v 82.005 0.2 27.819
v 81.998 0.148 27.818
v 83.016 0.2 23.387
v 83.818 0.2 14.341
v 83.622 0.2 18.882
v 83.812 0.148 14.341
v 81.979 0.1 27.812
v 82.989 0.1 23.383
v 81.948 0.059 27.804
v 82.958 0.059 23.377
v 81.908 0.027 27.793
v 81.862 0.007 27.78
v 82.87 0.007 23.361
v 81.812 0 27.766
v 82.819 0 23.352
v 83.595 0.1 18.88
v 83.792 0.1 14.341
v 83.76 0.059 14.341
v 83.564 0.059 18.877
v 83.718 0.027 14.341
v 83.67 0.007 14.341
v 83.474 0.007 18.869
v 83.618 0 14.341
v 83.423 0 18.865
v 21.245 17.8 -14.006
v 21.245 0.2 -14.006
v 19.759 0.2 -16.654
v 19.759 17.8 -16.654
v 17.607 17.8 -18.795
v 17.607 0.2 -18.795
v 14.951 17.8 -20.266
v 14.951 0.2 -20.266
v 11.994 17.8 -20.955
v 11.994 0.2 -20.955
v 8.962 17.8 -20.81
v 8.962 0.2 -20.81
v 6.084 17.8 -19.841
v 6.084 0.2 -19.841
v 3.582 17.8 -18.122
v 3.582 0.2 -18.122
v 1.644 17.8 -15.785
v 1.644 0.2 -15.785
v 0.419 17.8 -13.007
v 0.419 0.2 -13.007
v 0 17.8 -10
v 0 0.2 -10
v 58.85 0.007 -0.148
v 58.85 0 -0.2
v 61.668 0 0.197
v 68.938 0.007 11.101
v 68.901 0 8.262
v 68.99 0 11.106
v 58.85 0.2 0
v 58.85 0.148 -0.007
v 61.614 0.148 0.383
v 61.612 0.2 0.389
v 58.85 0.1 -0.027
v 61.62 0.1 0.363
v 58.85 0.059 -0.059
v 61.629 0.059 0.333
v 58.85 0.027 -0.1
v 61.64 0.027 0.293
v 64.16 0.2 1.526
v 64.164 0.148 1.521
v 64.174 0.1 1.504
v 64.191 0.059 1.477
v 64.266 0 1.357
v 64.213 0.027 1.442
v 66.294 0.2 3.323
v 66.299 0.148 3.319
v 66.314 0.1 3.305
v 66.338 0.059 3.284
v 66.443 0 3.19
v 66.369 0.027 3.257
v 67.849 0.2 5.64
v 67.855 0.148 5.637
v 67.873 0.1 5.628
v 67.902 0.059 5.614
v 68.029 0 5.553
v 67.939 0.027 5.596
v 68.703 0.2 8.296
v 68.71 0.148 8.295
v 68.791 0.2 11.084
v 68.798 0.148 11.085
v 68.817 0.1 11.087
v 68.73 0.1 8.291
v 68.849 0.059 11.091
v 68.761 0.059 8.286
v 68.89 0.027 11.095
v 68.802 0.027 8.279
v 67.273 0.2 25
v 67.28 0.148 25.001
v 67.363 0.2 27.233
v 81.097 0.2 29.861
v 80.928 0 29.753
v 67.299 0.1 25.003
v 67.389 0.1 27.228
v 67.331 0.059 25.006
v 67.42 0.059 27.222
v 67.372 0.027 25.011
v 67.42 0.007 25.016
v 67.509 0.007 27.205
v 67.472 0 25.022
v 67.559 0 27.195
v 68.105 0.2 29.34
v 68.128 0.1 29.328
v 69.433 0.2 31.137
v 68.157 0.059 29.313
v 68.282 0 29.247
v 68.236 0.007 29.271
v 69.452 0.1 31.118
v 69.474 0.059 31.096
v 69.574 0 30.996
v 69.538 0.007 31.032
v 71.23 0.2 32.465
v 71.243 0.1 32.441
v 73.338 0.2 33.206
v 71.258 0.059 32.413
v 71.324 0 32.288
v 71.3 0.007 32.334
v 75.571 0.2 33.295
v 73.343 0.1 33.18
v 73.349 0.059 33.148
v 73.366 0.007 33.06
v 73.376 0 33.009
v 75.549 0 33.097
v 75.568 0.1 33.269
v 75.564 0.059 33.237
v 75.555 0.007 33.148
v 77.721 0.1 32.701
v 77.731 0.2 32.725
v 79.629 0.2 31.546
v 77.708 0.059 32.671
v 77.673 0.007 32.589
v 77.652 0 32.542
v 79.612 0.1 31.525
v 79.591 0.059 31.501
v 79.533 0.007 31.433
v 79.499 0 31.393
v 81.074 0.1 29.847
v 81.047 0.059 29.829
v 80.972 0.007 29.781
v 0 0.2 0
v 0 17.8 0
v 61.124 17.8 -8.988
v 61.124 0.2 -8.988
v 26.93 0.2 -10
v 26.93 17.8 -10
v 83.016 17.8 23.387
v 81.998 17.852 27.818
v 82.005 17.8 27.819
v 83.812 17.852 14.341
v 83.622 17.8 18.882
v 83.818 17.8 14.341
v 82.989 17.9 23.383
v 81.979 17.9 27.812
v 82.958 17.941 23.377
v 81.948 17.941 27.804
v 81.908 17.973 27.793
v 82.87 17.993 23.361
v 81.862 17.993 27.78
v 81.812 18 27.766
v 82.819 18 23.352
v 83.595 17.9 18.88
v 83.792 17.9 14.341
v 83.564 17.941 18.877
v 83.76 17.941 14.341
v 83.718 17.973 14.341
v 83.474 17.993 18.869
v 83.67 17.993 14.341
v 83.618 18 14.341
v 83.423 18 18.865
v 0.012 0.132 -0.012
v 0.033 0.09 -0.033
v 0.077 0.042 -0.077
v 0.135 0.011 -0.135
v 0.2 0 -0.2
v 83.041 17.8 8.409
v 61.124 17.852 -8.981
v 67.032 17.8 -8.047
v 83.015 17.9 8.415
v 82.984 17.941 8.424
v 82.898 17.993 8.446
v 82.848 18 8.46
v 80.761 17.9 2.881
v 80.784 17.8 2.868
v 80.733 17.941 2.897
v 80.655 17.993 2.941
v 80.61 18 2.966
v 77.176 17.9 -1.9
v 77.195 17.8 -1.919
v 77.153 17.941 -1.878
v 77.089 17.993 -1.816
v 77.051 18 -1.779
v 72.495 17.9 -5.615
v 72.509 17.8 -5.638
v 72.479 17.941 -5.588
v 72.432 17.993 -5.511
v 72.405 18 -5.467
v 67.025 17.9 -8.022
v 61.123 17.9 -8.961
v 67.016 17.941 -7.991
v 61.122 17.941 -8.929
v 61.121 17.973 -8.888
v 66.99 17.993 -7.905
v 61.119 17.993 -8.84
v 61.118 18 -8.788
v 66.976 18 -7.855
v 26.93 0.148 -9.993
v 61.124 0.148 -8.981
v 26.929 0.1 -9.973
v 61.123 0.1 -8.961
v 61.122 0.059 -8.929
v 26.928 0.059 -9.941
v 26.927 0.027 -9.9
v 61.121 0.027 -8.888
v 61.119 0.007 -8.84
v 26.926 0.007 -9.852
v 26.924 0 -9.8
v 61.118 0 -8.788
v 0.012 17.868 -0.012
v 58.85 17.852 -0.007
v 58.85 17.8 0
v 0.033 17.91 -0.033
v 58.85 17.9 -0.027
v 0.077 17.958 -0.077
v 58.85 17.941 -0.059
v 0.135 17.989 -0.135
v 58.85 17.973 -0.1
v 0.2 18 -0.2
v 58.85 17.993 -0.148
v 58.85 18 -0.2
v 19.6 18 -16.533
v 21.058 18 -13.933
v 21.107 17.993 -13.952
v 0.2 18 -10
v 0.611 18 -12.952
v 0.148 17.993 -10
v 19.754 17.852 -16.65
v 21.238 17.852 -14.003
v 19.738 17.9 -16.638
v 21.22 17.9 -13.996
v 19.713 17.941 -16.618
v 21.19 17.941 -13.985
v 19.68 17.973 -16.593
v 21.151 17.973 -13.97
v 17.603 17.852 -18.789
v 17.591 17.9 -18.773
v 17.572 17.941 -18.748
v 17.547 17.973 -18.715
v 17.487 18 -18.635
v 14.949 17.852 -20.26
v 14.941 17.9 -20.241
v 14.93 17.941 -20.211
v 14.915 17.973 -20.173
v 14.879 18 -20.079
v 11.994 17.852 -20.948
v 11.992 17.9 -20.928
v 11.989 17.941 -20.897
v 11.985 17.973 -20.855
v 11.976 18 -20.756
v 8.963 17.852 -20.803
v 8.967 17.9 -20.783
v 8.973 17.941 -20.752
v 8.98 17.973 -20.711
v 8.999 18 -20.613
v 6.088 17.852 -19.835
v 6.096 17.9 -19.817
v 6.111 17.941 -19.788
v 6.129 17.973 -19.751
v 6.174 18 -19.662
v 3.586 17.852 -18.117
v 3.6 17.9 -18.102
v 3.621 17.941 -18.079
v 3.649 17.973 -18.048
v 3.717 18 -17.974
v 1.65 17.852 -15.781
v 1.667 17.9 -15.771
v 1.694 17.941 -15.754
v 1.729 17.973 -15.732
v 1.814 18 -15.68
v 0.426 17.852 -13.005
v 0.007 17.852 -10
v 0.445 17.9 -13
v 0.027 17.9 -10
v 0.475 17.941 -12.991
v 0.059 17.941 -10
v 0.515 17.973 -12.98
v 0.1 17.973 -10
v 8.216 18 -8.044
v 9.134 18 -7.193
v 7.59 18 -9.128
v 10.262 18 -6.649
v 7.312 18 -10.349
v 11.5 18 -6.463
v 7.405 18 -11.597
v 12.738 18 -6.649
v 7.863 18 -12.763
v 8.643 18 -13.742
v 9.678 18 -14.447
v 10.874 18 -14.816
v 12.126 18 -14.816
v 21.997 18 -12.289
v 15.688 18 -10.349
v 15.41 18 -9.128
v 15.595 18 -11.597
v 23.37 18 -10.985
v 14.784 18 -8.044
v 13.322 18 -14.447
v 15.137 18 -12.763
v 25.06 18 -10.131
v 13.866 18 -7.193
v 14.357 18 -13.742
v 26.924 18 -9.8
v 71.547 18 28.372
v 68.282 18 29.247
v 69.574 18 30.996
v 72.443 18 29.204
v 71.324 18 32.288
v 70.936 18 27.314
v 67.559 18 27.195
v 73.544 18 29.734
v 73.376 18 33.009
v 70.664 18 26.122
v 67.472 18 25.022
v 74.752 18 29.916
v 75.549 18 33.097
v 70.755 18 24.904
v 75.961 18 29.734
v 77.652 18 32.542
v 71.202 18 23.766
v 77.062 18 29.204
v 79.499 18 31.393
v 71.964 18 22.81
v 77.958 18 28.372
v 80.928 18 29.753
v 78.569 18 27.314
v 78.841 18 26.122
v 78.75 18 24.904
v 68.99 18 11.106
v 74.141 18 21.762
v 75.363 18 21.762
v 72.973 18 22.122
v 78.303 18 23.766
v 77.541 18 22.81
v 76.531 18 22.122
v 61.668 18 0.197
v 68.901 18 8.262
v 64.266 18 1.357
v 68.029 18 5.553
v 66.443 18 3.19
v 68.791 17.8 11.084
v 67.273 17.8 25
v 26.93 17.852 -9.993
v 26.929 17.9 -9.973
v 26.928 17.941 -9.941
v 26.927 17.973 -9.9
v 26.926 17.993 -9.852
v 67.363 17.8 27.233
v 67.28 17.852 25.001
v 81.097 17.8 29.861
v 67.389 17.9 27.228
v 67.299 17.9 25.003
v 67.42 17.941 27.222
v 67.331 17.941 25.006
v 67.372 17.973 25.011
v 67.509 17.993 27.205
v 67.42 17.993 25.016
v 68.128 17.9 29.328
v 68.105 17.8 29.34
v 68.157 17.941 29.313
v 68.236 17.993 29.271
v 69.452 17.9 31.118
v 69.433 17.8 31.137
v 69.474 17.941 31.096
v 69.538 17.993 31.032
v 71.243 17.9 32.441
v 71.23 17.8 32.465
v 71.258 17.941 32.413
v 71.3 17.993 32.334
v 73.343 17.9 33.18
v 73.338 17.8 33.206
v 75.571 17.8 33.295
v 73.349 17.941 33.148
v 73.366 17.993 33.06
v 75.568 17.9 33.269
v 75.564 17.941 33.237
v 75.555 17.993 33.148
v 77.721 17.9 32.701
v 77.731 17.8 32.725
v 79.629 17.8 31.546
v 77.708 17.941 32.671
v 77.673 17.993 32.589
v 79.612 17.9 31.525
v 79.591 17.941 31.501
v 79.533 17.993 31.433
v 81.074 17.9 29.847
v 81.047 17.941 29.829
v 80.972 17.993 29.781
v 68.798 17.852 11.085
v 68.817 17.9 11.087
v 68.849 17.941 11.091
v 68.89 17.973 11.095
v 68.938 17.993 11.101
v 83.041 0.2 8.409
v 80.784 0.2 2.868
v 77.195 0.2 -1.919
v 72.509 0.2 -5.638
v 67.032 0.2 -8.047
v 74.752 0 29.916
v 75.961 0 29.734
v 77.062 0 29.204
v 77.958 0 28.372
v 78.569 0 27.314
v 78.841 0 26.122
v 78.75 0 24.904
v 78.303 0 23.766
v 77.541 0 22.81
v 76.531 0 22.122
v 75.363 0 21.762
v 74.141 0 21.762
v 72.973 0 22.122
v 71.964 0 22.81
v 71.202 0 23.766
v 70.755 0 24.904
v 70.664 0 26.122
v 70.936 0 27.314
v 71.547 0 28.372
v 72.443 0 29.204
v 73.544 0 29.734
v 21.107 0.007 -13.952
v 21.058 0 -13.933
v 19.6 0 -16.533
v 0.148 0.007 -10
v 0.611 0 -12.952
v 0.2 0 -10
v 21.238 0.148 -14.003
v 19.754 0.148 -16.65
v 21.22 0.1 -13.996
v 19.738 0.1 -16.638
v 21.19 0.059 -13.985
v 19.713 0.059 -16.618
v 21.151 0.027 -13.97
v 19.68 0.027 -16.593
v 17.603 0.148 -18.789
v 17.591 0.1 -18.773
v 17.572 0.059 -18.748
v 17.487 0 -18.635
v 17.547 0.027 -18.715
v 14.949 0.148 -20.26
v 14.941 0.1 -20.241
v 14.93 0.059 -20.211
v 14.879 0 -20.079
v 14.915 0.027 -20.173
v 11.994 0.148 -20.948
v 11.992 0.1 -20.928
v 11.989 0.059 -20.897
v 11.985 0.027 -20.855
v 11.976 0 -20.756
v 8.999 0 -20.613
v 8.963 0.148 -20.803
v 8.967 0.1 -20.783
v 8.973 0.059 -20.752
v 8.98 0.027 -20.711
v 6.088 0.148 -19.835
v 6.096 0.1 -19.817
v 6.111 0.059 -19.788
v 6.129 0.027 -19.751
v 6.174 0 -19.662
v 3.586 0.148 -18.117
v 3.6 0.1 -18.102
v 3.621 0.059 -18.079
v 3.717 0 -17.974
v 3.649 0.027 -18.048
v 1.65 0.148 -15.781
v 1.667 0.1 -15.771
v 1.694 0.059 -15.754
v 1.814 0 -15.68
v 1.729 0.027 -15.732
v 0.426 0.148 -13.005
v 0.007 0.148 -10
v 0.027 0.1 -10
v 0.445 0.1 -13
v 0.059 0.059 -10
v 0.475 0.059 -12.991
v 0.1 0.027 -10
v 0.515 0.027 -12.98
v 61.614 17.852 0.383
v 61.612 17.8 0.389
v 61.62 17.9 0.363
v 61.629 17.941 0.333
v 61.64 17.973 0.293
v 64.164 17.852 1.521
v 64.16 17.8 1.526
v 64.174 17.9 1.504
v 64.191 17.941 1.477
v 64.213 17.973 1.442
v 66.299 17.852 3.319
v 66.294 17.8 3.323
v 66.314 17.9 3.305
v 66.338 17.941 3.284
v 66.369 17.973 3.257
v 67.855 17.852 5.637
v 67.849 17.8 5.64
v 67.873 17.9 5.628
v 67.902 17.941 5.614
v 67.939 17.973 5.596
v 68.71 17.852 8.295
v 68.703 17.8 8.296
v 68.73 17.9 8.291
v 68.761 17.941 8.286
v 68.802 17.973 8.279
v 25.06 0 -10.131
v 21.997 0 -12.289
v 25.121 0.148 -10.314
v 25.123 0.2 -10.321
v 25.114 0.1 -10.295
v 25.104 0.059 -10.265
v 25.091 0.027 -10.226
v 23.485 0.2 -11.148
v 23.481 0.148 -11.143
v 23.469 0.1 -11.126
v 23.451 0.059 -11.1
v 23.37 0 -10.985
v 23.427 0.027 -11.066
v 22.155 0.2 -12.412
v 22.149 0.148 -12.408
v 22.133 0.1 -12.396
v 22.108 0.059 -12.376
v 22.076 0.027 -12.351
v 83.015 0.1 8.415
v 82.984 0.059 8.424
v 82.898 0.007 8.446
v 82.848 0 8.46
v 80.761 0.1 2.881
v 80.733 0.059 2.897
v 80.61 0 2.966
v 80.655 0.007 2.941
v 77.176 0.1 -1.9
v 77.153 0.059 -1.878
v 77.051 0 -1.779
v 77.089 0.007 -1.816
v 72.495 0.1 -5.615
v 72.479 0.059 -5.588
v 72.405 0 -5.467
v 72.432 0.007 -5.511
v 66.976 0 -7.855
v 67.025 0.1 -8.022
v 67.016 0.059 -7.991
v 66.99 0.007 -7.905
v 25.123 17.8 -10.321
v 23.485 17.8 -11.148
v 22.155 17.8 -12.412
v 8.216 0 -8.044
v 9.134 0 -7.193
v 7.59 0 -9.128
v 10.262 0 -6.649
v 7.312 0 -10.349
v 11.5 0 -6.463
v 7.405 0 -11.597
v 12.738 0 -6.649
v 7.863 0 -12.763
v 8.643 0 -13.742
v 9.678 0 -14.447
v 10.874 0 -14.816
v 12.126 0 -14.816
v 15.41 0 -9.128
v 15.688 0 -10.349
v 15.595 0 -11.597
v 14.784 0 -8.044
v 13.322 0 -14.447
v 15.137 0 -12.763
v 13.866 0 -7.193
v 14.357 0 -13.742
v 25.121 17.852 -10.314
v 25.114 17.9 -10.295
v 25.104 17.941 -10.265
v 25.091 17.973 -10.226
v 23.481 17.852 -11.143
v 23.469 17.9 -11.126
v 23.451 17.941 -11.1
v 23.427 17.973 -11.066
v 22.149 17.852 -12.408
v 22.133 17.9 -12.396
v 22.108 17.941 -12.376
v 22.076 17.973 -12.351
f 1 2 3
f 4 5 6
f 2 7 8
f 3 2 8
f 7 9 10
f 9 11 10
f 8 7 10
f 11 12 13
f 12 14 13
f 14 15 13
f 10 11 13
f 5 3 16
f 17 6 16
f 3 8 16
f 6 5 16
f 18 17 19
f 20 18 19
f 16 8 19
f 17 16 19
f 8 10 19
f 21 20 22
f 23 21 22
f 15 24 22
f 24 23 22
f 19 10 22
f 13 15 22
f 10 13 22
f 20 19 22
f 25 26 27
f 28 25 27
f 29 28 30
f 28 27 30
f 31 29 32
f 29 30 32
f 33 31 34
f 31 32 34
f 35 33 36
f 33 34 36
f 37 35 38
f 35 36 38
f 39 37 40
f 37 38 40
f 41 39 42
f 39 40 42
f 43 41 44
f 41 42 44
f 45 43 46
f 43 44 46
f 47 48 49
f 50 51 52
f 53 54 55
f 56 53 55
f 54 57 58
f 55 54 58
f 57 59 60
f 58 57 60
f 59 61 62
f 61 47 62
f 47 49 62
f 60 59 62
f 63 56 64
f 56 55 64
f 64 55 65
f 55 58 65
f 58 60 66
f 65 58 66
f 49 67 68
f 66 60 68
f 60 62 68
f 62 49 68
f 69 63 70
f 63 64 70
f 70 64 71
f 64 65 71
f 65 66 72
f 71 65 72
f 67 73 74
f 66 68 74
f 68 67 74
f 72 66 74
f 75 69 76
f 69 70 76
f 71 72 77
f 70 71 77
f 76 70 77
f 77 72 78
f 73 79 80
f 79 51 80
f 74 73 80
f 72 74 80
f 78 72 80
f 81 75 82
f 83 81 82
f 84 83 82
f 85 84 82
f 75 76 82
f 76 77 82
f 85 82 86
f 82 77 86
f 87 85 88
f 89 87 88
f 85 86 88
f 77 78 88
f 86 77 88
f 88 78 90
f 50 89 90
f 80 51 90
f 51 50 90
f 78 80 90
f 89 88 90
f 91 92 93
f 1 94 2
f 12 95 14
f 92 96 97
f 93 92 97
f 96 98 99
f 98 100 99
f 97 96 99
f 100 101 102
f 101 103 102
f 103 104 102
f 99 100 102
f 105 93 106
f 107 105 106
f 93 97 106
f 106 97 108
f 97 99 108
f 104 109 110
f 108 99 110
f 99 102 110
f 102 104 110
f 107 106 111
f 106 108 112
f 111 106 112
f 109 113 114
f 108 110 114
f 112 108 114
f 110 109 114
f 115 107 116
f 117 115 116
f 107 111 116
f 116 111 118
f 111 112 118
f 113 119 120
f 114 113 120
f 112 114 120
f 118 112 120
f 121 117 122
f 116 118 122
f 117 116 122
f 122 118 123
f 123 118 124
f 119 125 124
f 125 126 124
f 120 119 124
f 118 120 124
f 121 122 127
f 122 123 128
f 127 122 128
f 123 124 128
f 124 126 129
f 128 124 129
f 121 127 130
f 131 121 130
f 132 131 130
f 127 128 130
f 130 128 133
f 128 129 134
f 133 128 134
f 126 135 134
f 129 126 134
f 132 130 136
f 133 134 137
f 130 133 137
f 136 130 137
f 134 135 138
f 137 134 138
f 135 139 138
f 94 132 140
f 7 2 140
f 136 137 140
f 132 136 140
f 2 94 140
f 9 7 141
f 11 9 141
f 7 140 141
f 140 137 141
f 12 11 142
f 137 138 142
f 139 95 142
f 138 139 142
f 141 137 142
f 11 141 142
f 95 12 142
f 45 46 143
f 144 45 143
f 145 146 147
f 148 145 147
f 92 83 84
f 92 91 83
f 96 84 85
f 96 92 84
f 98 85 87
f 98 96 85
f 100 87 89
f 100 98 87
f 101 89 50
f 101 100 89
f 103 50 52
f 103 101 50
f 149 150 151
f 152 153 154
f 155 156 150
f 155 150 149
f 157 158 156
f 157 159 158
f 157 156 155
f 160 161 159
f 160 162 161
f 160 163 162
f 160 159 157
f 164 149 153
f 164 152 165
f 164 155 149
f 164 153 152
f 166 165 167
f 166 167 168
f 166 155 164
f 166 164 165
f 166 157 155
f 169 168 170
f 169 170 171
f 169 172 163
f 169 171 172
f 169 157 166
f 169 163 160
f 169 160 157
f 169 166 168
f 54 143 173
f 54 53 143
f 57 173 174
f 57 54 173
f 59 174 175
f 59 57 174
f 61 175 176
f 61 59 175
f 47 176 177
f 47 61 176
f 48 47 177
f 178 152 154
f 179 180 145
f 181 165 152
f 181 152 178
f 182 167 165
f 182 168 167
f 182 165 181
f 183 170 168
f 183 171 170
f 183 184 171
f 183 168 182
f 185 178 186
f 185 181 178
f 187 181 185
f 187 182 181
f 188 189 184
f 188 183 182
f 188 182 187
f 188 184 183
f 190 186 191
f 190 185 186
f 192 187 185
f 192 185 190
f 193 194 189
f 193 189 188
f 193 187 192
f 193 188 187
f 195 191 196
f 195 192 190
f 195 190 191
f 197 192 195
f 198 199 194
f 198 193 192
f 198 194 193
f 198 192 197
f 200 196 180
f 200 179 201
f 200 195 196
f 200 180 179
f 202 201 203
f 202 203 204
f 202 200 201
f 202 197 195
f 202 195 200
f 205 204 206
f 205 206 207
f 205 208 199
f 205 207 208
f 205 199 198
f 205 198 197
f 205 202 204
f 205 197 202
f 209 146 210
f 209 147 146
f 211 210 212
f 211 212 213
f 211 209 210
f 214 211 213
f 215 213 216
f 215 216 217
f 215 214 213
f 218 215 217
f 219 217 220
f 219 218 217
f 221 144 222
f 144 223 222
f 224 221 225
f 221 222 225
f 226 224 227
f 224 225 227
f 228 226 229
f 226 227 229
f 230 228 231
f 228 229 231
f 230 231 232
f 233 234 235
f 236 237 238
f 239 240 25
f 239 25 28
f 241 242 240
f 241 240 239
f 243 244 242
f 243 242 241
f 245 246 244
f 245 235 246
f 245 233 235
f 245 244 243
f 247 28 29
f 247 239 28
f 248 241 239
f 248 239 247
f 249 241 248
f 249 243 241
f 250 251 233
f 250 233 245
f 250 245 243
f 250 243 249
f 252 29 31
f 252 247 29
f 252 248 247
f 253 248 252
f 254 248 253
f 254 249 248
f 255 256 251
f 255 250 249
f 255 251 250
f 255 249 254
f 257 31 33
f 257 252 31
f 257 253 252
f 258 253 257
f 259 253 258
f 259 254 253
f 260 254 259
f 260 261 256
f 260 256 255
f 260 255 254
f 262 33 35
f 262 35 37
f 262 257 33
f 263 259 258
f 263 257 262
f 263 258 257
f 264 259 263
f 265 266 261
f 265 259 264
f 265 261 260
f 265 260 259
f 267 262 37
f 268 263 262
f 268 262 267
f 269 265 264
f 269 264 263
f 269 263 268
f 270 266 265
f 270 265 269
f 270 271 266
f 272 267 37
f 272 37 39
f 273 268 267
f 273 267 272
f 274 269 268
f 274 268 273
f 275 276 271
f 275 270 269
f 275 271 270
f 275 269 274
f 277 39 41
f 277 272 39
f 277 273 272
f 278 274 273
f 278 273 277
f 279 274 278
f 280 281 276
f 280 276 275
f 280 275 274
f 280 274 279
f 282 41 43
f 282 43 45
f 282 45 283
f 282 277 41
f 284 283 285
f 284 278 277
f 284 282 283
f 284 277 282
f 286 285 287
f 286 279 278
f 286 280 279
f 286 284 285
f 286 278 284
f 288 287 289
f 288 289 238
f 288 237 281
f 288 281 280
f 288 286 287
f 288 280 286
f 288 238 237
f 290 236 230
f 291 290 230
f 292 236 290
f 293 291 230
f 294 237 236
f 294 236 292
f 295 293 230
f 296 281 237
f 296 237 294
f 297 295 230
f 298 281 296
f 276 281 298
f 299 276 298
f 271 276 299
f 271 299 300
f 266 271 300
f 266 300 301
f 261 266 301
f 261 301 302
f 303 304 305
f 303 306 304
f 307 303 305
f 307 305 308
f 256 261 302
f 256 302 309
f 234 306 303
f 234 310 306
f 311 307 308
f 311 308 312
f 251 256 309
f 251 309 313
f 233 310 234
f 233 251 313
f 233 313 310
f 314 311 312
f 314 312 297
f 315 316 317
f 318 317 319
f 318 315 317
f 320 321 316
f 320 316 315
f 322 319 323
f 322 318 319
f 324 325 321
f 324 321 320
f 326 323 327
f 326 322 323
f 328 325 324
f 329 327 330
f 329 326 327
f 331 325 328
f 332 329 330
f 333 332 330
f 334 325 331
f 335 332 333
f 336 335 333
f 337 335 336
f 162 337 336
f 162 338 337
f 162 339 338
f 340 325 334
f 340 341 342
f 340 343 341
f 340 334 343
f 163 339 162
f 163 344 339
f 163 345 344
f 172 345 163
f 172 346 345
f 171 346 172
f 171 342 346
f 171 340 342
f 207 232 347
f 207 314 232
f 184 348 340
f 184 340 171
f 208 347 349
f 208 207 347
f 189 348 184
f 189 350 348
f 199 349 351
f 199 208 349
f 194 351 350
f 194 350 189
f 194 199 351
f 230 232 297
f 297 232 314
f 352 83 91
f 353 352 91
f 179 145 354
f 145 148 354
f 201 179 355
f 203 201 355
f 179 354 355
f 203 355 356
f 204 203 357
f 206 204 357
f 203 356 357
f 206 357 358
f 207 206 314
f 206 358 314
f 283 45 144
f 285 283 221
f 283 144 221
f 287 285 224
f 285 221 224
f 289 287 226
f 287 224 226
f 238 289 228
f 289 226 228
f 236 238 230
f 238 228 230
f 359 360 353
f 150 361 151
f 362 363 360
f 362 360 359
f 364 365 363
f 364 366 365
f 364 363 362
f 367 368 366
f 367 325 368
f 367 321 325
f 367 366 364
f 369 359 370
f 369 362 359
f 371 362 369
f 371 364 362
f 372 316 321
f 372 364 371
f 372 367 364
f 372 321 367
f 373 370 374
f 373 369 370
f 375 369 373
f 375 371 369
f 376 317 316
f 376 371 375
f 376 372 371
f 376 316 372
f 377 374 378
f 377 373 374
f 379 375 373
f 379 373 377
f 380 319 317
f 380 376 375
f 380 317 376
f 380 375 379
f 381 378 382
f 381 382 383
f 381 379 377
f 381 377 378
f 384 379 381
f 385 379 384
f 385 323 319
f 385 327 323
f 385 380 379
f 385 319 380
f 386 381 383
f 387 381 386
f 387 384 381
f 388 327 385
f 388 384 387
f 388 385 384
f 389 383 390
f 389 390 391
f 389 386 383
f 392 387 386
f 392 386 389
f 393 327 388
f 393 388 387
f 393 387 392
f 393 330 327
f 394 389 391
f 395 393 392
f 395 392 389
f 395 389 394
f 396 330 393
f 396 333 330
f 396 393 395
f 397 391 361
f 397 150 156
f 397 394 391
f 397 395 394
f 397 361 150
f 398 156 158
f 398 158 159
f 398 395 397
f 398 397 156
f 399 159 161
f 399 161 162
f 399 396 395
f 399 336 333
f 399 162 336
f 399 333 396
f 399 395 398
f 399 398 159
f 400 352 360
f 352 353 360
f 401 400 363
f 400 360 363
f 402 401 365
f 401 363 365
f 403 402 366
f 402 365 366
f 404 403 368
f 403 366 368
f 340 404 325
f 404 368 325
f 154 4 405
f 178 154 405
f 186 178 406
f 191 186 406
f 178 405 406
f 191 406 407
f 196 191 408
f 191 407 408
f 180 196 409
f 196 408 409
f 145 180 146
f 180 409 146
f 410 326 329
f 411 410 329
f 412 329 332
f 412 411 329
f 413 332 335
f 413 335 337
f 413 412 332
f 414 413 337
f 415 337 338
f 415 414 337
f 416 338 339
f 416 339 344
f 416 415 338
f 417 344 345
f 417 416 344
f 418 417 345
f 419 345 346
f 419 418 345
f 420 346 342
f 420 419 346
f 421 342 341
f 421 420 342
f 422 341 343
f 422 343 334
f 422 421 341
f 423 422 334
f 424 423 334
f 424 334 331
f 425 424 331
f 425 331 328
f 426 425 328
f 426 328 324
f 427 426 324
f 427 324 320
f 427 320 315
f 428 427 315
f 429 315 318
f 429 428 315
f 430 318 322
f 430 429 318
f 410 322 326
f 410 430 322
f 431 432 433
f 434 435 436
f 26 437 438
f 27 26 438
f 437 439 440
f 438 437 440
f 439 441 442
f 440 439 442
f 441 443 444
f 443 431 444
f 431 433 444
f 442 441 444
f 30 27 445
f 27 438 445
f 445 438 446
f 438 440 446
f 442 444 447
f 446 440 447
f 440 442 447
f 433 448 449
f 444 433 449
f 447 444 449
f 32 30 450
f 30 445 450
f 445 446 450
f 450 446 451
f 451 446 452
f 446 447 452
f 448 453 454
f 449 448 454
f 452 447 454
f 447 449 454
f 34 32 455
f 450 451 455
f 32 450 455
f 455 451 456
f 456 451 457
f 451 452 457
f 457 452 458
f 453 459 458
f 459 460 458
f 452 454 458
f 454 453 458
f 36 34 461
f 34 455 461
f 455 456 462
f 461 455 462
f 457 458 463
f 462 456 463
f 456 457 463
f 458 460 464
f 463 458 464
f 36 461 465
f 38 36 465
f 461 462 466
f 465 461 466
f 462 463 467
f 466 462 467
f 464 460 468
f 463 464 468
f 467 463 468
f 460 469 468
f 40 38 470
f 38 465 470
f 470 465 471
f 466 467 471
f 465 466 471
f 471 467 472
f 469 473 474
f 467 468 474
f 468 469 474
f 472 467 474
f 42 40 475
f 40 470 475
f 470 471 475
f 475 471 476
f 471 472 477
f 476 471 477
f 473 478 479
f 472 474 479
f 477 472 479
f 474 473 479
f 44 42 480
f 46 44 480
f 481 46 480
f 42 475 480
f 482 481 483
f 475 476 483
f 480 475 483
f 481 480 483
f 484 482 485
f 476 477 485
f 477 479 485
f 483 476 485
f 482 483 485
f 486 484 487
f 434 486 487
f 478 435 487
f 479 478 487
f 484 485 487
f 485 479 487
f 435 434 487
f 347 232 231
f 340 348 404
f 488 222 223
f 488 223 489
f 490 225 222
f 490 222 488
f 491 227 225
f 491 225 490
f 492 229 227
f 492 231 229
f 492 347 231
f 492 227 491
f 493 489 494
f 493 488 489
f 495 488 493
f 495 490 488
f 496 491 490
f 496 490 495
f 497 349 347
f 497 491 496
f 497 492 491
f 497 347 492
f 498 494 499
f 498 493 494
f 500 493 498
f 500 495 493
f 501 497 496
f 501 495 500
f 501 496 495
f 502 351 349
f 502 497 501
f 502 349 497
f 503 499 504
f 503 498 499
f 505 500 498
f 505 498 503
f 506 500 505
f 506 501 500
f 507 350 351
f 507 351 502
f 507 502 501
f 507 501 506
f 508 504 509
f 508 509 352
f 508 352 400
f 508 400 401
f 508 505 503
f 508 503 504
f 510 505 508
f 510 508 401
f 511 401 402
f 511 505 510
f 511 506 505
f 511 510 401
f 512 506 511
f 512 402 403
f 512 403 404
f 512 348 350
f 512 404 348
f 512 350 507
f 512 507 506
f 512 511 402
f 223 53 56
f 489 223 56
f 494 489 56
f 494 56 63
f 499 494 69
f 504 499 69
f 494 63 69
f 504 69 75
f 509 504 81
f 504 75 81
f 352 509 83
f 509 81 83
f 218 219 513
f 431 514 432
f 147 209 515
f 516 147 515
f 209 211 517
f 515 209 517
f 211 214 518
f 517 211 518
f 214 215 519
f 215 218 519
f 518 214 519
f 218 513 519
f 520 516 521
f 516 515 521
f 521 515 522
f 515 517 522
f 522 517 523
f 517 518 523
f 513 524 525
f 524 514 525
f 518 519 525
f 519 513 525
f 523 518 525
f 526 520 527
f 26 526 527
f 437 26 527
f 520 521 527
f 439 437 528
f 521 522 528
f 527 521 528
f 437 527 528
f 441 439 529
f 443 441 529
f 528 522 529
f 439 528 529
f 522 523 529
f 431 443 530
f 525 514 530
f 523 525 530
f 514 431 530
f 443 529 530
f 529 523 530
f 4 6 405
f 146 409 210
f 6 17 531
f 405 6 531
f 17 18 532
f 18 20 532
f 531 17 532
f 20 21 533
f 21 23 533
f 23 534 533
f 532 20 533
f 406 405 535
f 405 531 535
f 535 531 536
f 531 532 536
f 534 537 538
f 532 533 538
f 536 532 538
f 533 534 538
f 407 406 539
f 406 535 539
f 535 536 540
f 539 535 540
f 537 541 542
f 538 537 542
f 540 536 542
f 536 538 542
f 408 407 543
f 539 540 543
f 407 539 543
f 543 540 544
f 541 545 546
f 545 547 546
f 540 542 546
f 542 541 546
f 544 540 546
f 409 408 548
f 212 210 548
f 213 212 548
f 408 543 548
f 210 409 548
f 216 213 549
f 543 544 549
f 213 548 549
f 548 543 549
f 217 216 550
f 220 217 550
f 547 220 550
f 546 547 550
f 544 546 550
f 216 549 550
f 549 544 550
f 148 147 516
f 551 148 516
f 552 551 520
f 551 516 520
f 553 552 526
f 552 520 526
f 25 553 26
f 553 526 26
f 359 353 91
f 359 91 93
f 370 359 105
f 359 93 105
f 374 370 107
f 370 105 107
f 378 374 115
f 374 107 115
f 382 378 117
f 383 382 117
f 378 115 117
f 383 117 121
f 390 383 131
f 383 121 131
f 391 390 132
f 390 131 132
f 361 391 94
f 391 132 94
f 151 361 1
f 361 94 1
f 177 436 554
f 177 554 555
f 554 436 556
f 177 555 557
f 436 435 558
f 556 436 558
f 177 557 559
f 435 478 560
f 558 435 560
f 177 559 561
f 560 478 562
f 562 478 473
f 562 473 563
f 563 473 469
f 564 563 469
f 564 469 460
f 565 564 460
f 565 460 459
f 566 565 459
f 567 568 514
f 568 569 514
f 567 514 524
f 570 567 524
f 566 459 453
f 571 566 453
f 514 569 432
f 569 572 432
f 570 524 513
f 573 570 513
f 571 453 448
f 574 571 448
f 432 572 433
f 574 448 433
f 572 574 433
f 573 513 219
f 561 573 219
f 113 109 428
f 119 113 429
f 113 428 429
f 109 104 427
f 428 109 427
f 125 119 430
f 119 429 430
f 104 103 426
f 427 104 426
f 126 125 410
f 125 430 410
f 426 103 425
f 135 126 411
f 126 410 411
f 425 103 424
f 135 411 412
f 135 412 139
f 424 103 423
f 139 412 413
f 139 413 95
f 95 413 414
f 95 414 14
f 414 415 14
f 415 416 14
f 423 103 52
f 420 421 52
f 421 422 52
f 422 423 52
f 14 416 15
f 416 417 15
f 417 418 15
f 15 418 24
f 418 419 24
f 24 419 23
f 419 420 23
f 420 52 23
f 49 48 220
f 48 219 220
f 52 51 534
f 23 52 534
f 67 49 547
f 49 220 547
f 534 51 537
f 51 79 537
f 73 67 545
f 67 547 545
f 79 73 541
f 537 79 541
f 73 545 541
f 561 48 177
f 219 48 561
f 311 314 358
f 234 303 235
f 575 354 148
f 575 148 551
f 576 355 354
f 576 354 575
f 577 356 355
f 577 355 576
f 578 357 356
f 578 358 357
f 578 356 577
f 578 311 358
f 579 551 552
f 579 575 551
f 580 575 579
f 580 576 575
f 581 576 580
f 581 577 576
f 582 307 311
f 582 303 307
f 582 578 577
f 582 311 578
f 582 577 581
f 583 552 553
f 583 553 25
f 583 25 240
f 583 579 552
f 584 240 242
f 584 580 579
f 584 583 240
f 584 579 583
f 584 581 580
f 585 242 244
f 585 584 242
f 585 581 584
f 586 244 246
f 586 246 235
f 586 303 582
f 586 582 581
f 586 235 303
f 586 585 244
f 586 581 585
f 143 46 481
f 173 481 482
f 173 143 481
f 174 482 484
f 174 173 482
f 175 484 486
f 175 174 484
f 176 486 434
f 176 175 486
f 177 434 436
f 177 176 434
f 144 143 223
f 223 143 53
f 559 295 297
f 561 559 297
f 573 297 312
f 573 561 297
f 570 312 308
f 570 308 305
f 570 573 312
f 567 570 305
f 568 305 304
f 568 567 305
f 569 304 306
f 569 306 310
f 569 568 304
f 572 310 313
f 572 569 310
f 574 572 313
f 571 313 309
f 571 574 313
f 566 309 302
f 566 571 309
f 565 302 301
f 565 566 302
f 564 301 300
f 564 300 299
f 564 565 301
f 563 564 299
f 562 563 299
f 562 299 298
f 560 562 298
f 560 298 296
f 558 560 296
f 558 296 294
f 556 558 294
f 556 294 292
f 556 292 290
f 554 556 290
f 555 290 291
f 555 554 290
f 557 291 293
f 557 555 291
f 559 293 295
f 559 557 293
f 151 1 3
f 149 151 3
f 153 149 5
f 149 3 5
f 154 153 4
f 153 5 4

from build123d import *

# Parameters (mm, degrees)
SKETCH_1_R      = 4.1
SKETCH_1_R_2    = 4.2
EXTRUDE_1_DEPTH = 18
FILLET_1_R      = 0.2


with BuildPart() as part:
    # Эскиз1 → Бобышка-Вытянуть1 (new body)
    with BuildSketch(Plane(origin=(0, 0, 0), x_dir=(1, 0, 0), z_dir=(0, 1, 0))):
        with BuildLine():
            Line((0, 0), (58.849762768, 0))
            ThreePointArc((58.849762768, 0), (66.294383343, -3.323352301), (68.790784534, -11.084475102))
            Line((68.790784534, -11.084475102), (67.272727273, -25))
            ThreePointArc((67.272727273, -25), (73.338139081, -33.205921807), (82.0048561, -27.819421161))
            ThreePointArc((82.0048561, -27.819421161), (83.369847365, -21.141684374), (83.818322635, -14.340637419))
            ThreePointArc((83.818322635, -14.340637419), (77.194828854, 1.918929468), (61.12387315, 8.987774352))
            Line((61.12387315, 8.987774352), (26.92989503, 10))
            ThreePointArc((26.92989503, 10), (23.484932233, 11.148153988), (21.244623159, 14.005957604))
            ThreePointArc((21.244623159, 14.005957604), (8.961723124, 20.809506343), (0, 10))
            Line((0, 10), (0, 0))
        make_face()
        with Locations(Location((74.752421844, -25.81596668, 0), (0, 0, 270))):
            Circle(SKETCH_1_R, mode=Mode.SUBTRACT)
        with Locations(Location((11.5, 10.662869651, 0), (0, 0, 270))):
            Circle(SKETCH_1_R_2, mode=Mode.SUBTRACT)
    extrude(amount=EXTRUDE_1_DEPTH)

    # Скругление1
    fillet_1_edges = [part.edges().sort_by_distance(p)[0] for p in [
        (66.294383343, 18, 3.323352301),
        (44.02688409, 0, -9.493887176),
        (77.194828854, 0, -1.918929468),
        (83.369847365, 0, 21.141684374),
        (73.338139081, 0, 33.205921807),
        (68.031755904, 0, 18.042237551),
        (66.294383343, 0, 3.323352301),
        (29.424881384, 0, 0),
        (0, 0, -5),
        (68.031755904, 18, 18.042237551),
        (73.338139081, 18, 33.205921807),
        (83.369847365, 18, 21.141684374),
        (77.194828854, 18, -1.918929468),
        (44.02688409, 18, -9.493887176),
        (23.484932233, 18, -11.148153988),
        (8.961723124, 18, -20.809506343),
        (0, 18, -5),
        (29.424881384, 18, 0),
        (8.961723124, 0, -20.809506343),
        (23.484932233, 0, -11.148153988),
    ]]
    fillet(fillet_1_edges, radius=FILLET_1_R)


solid = part.part
